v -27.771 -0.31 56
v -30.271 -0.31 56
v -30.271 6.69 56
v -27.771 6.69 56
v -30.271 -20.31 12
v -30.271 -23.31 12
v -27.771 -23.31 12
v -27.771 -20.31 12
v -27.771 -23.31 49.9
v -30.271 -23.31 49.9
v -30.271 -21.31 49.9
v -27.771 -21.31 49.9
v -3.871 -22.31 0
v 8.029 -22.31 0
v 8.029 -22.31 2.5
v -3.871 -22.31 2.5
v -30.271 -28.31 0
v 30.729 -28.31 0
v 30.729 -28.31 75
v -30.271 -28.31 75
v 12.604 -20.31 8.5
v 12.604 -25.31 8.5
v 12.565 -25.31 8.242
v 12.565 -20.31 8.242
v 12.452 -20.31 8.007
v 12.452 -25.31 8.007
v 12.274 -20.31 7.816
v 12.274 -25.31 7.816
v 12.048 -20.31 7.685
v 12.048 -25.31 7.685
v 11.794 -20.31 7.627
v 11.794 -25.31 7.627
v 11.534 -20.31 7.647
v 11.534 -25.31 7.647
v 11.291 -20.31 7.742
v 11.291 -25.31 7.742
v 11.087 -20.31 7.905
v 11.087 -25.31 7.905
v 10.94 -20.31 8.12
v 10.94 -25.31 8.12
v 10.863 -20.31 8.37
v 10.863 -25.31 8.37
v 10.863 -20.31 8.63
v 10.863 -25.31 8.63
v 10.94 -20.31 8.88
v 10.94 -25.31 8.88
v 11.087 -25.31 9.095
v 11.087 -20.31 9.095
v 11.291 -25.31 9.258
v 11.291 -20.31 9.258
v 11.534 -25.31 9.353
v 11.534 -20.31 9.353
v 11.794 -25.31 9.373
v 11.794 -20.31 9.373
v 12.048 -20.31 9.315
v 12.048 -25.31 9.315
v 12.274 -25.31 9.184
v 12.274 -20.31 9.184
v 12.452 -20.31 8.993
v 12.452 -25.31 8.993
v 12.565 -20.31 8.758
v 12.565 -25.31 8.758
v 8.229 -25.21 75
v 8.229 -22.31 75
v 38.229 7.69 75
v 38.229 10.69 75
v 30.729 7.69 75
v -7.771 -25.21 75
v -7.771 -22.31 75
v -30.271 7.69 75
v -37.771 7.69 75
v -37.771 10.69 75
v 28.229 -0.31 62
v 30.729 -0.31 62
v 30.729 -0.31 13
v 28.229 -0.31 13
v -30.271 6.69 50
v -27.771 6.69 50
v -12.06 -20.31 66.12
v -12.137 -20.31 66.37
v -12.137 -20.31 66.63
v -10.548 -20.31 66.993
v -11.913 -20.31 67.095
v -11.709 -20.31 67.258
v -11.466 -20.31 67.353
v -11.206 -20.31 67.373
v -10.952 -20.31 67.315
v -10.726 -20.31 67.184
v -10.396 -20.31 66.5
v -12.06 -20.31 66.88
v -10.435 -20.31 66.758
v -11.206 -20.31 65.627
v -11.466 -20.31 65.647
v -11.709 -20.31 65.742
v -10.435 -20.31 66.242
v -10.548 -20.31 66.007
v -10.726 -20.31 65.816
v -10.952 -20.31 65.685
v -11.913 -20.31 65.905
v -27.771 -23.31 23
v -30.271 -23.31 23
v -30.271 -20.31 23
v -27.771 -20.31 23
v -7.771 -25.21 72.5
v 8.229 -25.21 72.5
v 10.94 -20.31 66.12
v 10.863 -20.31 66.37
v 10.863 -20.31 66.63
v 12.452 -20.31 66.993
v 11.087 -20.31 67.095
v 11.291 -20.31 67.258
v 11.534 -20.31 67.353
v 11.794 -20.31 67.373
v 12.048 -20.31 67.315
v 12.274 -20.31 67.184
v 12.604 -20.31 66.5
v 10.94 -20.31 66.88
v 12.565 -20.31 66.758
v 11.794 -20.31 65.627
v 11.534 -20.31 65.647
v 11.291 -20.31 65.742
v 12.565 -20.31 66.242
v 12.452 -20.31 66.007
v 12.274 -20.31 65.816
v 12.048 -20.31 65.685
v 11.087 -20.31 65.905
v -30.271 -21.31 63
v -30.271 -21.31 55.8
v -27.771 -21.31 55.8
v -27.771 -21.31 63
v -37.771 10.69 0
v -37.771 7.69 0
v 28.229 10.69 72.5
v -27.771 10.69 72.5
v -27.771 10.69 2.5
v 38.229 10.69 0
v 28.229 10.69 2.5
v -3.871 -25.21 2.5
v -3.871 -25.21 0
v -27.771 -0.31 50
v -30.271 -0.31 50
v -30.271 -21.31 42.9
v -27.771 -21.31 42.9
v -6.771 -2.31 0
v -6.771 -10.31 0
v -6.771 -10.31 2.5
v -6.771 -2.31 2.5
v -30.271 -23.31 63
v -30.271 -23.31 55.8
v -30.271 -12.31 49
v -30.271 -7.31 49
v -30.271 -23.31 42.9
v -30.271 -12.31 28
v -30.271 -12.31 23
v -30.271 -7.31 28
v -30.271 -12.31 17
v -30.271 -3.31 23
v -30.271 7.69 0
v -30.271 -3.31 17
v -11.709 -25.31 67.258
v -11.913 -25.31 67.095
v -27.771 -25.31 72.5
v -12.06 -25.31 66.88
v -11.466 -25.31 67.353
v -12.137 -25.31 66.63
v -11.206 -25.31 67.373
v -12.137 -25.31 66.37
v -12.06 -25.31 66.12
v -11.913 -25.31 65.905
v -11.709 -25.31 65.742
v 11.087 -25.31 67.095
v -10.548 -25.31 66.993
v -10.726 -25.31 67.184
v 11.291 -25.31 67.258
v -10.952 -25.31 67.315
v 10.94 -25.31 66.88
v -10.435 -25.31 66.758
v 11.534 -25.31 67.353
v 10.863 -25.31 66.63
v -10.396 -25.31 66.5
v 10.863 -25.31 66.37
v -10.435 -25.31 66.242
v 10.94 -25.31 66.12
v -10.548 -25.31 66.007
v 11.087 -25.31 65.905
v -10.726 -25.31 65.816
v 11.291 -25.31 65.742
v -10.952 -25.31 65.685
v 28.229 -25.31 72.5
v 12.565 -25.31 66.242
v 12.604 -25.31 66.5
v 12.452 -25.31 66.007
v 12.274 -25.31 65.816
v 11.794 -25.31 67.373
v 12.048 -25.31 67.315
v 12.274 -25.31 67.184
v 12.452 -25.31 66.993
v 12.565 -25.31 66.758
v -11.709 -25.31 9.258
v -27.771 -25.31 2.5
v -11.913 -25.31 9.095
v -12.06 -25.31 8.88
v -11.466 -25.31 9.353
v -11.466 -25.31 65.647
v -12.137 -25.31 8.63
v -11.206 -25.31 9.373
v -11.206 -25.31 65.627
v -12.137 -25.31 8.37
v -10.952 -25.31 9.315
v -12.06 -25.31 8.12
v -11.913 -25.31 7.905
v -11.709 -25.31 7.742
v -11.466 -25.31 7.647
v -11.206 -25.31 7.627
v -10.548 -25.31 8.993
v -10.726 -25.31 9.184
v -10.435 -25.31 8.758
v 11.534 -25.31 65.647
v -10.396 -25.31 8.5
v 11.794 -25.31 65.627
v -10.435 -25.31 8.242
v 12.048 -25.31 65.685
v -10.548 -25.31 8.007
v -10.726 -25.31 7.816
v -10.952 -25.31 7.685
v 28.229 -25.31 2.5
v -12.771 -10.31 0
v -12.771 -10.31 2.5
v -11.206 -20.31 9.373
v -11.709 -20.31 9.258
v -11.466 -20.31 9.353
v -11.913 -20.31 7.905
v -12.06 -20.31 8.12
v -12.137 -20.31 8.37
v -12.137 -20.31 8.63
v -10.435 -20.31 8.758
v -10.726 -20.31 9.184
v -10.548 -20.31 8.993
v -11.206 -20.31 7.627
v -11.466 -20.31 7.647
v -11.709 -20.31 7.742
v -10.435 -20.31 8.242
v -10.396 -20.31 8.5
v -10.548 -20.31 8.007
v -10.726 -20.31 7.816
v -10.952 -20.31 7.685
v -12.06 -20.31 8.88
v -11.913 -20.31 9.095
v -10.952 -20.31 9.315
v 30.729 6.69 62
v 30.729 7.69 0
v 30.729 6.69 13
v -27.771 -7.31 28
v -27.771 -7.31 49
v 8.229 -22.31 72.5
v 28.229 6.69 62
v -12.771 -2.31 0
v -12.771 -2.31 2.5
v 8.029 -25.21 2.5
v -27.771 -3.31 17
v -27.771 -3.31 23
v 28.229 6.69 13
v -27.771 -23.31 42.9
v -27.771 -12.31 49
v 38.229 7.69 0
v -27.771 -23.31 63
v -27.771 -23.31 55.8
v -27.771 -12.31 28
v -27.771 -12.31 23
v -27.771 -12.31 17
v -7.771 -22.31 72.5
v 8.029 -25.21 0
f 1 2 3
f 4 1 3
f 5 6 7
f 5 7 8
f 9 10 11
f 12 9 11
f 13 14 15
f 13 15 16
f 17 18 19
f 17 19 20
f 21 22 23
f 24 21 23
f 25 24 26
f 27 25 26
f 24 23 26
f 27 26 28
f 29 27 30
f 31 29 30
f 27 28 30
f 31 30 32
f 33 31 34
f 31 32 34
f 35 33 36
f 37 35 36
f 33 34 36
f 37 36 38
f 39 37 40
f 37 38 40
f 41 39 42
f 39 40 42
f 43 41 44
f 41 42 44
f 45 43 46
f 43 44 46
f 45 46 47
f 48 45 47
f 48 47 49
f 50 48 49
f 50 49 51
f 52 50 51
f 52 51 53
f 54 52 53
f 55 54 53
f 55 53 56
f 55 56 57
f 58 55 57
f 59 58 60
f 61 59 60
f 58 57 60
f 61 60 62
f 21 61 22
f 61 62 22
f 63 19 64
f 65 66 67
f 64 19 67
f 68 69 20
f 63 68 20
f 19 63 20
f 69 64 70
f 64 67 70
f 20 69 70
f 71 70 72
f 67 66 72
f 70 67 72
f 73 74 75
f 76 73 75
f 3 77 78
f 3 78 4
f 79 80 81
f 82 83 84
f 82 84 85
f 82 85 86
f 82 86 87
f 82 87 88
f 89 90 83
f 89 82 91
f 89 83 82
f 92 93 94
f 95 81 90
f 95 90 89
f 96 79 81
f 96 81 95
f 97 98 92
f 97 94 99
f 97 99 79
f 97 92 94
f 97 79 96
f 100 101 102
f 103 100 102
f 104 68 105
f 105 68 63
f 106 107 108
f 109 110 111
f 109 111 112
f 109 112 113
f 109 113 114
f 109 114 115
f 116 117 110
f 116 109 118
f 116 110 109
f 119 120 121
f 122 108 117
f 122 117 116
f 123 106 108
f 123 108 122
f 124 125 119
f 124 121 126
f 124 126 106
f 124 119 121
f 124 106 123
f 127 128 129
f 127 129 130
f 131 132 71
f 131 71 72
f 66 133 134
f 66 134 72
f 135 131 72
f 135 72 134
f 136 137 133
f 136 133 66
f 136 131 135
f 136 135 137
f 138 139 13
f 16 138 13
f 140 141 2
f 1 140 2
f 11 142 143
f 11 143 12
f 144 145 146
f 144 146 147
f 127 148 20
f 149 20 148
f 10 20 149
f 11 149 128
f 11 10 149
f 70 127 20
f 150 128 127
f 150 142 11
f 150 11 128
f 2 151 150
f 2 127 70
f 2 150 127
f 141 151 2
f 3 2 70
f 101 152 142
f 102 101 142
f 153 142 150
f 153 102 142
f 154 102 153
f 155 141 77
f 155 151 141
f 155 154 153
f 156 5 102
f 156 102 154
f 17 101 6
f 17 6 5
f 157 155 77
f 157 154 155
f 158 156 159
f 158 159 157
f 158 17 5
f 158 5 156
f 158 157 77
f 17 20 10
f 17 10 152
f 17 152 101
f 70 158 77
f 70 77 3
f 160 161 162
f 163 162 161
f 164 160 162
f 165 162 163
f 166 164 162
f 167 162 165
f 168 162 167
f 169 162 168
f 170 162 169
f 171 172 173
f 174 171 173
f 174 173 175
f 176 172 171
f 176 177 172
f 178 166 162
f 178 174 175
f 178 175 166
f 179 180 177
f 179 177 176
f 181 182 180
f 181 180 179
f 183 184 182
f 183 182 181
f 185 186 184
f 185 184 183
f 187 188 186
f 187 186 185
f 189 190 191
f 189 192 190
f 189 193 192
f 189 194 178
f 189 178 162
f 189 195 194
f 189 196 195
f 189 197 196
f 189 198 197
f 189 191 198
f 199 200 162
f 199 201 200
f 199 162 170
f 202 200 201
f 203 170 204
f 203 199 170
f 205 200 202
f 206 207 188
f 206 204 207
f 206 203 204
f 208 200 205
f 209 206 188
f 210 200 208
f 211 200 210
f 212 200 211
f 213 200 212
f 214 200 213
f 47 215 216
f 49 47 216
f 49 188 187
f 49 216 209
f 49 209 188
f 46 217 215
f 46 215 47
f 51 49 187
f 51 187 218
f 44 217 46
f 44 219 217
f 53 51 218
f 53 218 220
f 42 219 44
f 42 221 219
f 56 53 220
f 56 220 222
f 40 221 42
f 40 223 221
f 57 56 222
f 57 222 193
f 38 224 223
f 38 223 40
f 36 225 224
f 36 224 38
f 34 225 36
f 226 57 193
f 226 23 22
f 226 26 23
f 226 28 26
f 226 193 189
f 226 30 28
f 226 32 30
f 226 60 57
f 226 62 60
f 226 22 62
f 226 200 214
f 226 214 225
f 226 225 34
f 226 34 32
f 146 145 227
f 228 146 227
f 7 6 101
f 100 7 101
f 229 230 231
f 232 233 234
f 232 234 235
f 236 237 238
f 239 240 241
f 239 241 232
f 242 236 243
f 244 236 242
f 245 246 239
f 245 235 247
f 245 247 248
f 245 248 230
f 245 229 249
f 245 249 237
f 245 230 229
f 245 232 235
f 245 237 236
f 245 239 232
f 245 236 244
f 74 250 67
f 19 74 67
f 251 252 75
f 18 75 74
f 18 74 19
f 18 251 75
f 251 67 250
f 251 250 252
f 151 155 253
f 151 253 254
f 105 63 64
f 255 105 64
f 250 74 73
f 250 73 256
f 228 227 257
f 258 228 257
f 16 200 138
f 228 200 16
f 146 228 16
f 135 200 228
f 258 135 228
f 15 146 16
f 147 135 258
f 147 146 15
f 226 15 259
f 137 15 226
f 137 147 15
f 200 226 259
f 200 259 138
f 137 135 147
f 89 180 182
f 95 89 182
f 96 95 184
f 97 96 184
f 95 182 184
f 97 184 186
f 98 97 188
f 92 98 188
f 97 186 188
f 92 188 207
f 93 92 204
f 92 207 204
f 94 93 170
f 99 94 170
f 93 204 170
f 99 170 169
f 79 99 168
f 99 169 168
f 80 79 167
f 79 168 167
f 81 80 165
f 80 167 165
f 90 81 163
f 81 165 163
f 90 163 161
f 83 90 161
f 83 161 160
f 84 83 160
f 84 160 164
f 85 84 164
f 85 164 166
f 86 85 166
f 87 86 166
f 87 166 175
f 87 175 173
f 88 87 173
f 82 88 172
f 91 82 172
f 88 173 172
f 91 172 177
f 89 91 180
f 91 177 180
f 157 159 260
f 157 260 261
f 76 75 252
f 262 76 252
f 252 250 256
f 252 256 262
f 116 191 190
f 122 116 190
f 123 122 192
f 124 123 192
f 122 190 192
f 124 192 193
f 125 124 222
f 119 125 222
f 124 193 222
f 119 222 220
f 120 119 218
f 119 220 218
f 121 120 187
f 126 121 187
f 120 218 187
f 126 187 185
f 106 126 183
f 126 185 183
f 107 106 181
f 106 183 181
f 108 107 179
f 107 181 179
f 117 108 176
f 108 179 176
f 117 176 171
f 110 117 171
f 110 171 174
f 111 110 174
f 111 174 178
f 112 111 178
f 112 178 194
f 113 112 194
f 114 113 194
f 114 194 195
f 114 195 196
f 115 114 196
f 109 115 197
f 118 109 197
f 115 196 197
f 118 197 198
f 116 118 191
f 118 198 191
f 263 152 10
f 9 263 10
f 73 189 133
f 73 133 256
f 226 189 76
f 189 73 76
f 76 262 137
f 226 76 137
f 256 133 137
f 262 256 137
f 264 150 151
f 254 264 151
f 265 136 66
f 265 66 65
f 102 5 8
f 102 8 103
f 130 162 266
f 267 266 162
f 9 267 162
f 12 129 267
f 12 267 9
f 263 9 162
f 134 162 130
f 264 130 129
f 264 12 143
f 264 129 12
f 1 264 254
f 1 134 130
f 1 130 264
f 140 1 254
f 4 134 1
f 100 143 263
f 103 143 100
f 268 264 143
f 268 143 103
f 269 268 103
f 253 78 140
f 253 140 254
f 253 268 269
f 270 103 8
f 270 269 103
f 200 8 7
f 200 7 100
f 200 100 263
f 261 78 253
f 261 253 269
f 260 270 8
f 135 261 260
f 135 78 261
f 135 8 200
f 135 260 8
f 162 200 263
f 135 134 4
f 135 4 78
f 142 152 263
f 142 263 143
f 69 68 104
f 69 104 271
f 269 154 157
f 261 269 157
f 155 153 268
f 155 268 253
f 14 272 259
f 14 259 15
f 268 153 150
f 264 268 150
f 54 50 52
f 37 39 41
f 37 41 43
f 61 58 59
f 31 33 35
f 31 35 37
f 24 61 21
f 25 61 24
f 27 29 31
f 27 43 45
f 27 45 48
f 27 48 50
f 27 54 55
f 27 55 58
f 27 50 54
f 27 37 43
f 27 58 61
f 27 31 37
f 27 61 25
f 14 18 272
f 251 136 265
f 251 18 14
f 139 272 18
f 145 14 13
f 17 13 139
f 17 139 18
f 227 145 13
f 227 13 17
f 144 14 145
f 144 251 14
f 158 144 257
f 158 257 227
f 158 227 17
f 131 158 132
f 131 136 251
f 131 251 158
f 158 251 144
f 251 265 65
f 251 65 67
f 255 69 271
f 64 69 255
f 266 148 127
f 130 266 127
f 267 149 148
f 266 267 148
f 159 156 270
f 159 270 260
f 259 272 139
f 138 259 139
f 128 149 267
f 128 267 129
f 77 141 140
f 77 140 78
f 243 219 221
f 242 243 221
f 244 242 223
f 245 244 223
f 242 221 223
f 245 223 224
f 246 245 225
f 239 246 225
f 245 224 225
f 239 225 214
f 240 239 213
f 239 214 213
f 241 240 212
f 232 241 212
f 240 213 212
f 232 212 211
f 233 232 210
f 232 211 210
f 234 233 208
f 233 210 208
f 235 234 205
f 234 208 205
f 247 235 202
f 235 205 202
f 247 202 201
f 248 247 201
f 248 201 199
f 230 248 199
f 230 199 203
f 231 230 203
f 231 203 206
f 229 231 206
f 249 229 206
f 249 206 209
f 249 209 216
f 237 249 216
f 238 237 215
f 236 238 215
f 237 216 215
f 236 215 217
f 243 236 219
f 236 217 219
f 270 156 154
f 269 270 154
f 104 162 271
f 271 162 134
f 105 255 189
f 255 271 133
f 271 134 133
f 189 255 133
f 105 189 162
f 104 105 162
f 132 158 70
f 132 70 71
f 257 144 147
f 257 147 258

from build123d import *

# Parameters (mm, degrees)
BOSS_EXTRUDE1_DEPTH = 75
SKETCH4_W           = 56
SKETCH4_H           = 70
CUT_EXTRUDE1_DEPTH  = 36
SKETCH21_R          = 0.875
BOSS_EXTRUDE3_DEPTH = 5
CUT_EXTRUDE2_REACH  = 77
SKETCH23_W          = 11.9
SKETCH23_H          = 2.9
CUT_EXTRUDE3_REACH  = 70.5
SKETCH24_W          = 11
SKETCH24_H          = 3
CUT_EXTRUDE4_REACH  = 70.5
SKETCH25_W          = 7
SKETCH25_H          = 2
CUT_EXTRUDE5_REACH  = 70.5
SKETCH26_W          = 7.2
SKETCH26_H          = 2
CUT_EXTRUDE6_REACH  = 77
SKETCH27_W          = 16
SKETCH27_H          = 2.9
CUT_EXTRUDE7_REACH  = 70.5
SKETCH28_W          = 6
SKETCH28_H          = 9
CUT_EXTRUDE8_REACH  = 70.5
SKETCH29_W          = 21
SKETCH29_H          = 5
CUT_EXTRUDE9_REACH  = 77
SKETCH30_W          = 6
SKETCH30_H          = 8
CUT_EXTRUDE10_REACH = 70.5
SKETCH31_W          = 49
SKETCH31_H          = 7
CUT_EXTRUDE11_REACH = 70.5
SKETCH32_W          = 6
SKETCH32_H          = 7


with BuildPart() as part:
    # Sketch1 → Boss-Extrude1 (new body)
    with BuildSketch(Plane.XY):
        Polygon((-37.771390637, 7.690116692), (-37.771390637, 10.690116692), (38.228609363, 10.690116692), (38.228609363, 7.690116692), (30.728609363, 7.690116692), (30.728609363, -28.309883308), (-30.271390637, -28.309883308), (-30.271390637, 7.690116692), align=None)
    extrude(amount=BOSS_EXTRUDE1_DEPTH)

    # Sketch4 → Cut-Extrude1 (cut)
    with BuildSketch(Plane(origin=(0, 10.690116692, 0), x_dir=(1, 0, 0), z_dir=(0, 1, 0))):
        with Locations((0.228609363, -37.5)):
            Rectangle(SKETCH4_W, SKETCH4_H)
    extrude(amount=-CUT_EXTRUDE1_DEPTH, mode=Mode.SUBTRACT)

    # Sketch21 → Boss-Extrude3 (add)
    with BuildSketch(Plane(origin=(0, -25.309883308, 0), x_dir=(1, 0, 0), z_dir=(0, 1, 0))):
        with Locations((-11.271390637, -8.5)):
            Circle(SKETCH21_R)
        with Locations((11.728609363, -8.5)):
            Circle(SKETCH21_R)
        with Locations((-11.271390637, -66.5)):
            Circle(SKETCH21_R)
        with Locations((11.728609363, -66.5)):
            Circle(SKETCH21_R)
    extrude(amount=BOSS_EXTRUDE3_DEPTH)

    # Sketch23 → Cut-Extrude2 (cut, up to next)
    with BuildSketch(Plane(origin=(0, 0, 0), x_dir=(-1, 0, 0), z_dir=(0, 0, -1)), mode=Mode.PRIVATE) as cut_extrude2_sk1:
        with Locations((-2.078609363, -23.759883308)):
            Rectangle(SKETCH23_W, SKETCH23_H)
    cut_extrude2_tool1 = extrude(cut_extrude2_sk1.sketch, amount=-CUT_EXTRUDE2_REACH, mode=Mode.PRIVATE) & part.part
    add(cut_extrude2_tool1.solids().sort_by_distance((2.078609, -23.759883, 0))[0], mode=Mode.SUBTRACT)

    # Sketch24 → Cut-Extrude3 (cut, up to next)
    with BuildSketch(Plane.ZY.offset(30.271390637), mode=Mode.PRIVATE) as cut_extrude3_sk1:
        with Locations((17.5, -21.809883308)):
            Rectangle(SKETCH24_W, SKETCH24_H)
    cut_extrude3_tool1 = extrude(cut_extrude3_sk1.sketch, amount=-CUT_EXTRUDE3_REACH, mode=Mode.PRIVATE) & part.part
    add(cut_extrude3_tool1.solids().sort_by_distance((-30.271391, -21.809883, 17.5))[0], mode=Mode.SUBTRACT)

    # Sketch25 → Cut-Extrude4 (cut, up to next)
    with BuildSketch(Plane.ZY.offset(30.271390637), mode=Mode.PRIVATE) as cut_extrude4_sk1:
        with Locations((46.4, -22.309883308)):
            Rectangle(SKETCH25_W, SKETCH25_H)
    cut_extrude4_tool1 = extrude(cut_extrude4_sk1.sketch, amount=-CUT_EXTRUDE4_REACH, mode=Mode.PRIVATE) & part.part
    add(cut_extrude4_tool1.solids().sort_by_distance((-30.271391, -22.309883, 46.4))[0], mode=Mode.SUBTRACT)

    # Sketch26 → Cut-Extrude5 (cut, up to next)
    with BuildSketch(Plane.ZY.offset(30.271390637), mode=Mode.PRIVATE) as cut_extrude5_sk1:
        with Locations((59.4, -22.309883308)):
            Rectangle(SKETCH26_W, SKETCH26_H)
    cut_extrude5_tool1 = extrude(cut_extrude5_sk1.sketch, amount=-CUT_EXTRUDE5_REACH, mode=Mode.PRIVATE) & part.part
    add(cut_extrude5_tool1.solids().sort_by_distance((-30.271391, -22.309883, 59.4))[0], mode=Mode.SUBTRACT)

    # Sketch27 → Cut-Extrude6 (cut, up to next)
    with BuildSketch(Plane.XY.offset(75), mode=Mode.PRIVATE) as cut_extrude6_sk1:
        with Locations((0.228609363, -23.759883308)):
            Rectangle(SKETCH27_W, SKETCH27_H)
    cut_extrude6_tool1 = extrude(cut_extrude6_sk1.sketch, amount=-CUT_EXTRUDE6_REACH, mode=Mode.PRIVATE) & part.part
    add(cut_extrude6_tool1.solids().sort_by_distance((0.228609, -23.759883, 75))[0], mode=Mode.SUBTRACT)

    # Sketch28 → Cut-Extrude7 (cut, up to next)
    with BuildSketch(Plane.ZY.offset(30.271390637), mode=Mode.PRIVATE) as cut_extrude7_sk1:
        with Locations((20, -7.809883308)):
            Rectangle(SKETCH28_W, SKETCH28_H)
    cut_extrude7_tool1 = extrude(cut_extrude7_sk1.sketch, amount=-CUT_EXTRUDE7_REACH, mode=Mode.PRIVATE) & part.part
    add(cut_extrude7_tool1.solids().sort_by_distance((-30.271391, -7.809883, 20))[0], mode=Mode.SUBTRACT)

    # Sketch29 → Cut-Extrude8 (cut, up to next)
    with BuildSketch(Plane.ZY.offset(30.271390637), mode=Mode.PRIVATE) as cut_extrude8_sk1:
        with Locations((38.5, -9.809883308)):
            Rectangle(SKETCH29_W, SKETCH29_H)
    cut_extrude8_tool1 = extrude(cut_extrude8_sk1.sketch, amount=-CUT_EXTRUDE8_REACH, mode=Mode.PRIVATE) & part.part
    add(cut_extrude8_tool1.solids().sort_by_distance((-30.271391, -9.809883, 38.5))[0], mode=Mode.SUBTRACT)

    # Sketch30 → Cut-Extrude9 (cut, up to next)
    with BuildSketch(Plane(origin=(0, 0, 0), x_dir=(-1, 0, 0), z_dir=(0, 0, -1)), mode=Mode.PRIVATE) as cut_extrude9_sk1:
        with Locations((9.771390637, -6.309883308)):
            Rectangle(SKETCH30_W, SKETCH30_H)
    cut_extrude9_tool1 = extrude(cut_extrude9_sk1.sketch, amount=-CUT_EXTRUDE9_REACH, mode=Mode.PRIVATE) & part.part
    add(cut_extrude9_tool1.solids().sort_by_distance((-9.771391, -6.309883, 0))[0], mode=Mode.SUBTRACT)

    # Sketch31 → Cut-Extrude10 (cut, up to next)
    with BuildSketch(Plane(origin=(30.728609363, 0, 0), x_dir=(0, 0, -1), z_dir=(1, 0, 0)), mode=Mode.PRIVATE) as cut_extrude10_sk1:
        with Locations((-37.5, 3.190116692)):
            Rectangle(SKETCH31_W, SKETCH31_H)
    cut_extrude10_tool1 = extrude(cut_extrude10_sk1.sketch, amount=-CUT_EXTRUDE10_REACH, mode=Mode.PRIVATE) & part.part
    add(cut_extrude10_tool1.solids().sort_by_distance((30.728609, 3.190117, 37.5))[0], mode=Mode.SUBTRACT)

    # Sketch32 → Cut-Extrude11 (cut, up to next)
    with BuildSketch(Plane.ZY.offset(30.271390637), mode=Mode.PRIVATE) as cut_extrude11_sk1:
        with Locations((53, 3.190116692)):
            Rectangle(SKETCH32_W, SKETCH32_H)
    cut_extrude11_tool1 = extrude(cut_extrude11_sk1.sketch, amount=-CUT_EXTRUDE11_REACH, mode=Mode.PRIVATE) & part.part
    add(cut_extrude11_tool1.solids().sort_by_distance((-30.271391, 3.190117, 53))[0], mode=Mode.SUBTRACT)


solid = part.part
